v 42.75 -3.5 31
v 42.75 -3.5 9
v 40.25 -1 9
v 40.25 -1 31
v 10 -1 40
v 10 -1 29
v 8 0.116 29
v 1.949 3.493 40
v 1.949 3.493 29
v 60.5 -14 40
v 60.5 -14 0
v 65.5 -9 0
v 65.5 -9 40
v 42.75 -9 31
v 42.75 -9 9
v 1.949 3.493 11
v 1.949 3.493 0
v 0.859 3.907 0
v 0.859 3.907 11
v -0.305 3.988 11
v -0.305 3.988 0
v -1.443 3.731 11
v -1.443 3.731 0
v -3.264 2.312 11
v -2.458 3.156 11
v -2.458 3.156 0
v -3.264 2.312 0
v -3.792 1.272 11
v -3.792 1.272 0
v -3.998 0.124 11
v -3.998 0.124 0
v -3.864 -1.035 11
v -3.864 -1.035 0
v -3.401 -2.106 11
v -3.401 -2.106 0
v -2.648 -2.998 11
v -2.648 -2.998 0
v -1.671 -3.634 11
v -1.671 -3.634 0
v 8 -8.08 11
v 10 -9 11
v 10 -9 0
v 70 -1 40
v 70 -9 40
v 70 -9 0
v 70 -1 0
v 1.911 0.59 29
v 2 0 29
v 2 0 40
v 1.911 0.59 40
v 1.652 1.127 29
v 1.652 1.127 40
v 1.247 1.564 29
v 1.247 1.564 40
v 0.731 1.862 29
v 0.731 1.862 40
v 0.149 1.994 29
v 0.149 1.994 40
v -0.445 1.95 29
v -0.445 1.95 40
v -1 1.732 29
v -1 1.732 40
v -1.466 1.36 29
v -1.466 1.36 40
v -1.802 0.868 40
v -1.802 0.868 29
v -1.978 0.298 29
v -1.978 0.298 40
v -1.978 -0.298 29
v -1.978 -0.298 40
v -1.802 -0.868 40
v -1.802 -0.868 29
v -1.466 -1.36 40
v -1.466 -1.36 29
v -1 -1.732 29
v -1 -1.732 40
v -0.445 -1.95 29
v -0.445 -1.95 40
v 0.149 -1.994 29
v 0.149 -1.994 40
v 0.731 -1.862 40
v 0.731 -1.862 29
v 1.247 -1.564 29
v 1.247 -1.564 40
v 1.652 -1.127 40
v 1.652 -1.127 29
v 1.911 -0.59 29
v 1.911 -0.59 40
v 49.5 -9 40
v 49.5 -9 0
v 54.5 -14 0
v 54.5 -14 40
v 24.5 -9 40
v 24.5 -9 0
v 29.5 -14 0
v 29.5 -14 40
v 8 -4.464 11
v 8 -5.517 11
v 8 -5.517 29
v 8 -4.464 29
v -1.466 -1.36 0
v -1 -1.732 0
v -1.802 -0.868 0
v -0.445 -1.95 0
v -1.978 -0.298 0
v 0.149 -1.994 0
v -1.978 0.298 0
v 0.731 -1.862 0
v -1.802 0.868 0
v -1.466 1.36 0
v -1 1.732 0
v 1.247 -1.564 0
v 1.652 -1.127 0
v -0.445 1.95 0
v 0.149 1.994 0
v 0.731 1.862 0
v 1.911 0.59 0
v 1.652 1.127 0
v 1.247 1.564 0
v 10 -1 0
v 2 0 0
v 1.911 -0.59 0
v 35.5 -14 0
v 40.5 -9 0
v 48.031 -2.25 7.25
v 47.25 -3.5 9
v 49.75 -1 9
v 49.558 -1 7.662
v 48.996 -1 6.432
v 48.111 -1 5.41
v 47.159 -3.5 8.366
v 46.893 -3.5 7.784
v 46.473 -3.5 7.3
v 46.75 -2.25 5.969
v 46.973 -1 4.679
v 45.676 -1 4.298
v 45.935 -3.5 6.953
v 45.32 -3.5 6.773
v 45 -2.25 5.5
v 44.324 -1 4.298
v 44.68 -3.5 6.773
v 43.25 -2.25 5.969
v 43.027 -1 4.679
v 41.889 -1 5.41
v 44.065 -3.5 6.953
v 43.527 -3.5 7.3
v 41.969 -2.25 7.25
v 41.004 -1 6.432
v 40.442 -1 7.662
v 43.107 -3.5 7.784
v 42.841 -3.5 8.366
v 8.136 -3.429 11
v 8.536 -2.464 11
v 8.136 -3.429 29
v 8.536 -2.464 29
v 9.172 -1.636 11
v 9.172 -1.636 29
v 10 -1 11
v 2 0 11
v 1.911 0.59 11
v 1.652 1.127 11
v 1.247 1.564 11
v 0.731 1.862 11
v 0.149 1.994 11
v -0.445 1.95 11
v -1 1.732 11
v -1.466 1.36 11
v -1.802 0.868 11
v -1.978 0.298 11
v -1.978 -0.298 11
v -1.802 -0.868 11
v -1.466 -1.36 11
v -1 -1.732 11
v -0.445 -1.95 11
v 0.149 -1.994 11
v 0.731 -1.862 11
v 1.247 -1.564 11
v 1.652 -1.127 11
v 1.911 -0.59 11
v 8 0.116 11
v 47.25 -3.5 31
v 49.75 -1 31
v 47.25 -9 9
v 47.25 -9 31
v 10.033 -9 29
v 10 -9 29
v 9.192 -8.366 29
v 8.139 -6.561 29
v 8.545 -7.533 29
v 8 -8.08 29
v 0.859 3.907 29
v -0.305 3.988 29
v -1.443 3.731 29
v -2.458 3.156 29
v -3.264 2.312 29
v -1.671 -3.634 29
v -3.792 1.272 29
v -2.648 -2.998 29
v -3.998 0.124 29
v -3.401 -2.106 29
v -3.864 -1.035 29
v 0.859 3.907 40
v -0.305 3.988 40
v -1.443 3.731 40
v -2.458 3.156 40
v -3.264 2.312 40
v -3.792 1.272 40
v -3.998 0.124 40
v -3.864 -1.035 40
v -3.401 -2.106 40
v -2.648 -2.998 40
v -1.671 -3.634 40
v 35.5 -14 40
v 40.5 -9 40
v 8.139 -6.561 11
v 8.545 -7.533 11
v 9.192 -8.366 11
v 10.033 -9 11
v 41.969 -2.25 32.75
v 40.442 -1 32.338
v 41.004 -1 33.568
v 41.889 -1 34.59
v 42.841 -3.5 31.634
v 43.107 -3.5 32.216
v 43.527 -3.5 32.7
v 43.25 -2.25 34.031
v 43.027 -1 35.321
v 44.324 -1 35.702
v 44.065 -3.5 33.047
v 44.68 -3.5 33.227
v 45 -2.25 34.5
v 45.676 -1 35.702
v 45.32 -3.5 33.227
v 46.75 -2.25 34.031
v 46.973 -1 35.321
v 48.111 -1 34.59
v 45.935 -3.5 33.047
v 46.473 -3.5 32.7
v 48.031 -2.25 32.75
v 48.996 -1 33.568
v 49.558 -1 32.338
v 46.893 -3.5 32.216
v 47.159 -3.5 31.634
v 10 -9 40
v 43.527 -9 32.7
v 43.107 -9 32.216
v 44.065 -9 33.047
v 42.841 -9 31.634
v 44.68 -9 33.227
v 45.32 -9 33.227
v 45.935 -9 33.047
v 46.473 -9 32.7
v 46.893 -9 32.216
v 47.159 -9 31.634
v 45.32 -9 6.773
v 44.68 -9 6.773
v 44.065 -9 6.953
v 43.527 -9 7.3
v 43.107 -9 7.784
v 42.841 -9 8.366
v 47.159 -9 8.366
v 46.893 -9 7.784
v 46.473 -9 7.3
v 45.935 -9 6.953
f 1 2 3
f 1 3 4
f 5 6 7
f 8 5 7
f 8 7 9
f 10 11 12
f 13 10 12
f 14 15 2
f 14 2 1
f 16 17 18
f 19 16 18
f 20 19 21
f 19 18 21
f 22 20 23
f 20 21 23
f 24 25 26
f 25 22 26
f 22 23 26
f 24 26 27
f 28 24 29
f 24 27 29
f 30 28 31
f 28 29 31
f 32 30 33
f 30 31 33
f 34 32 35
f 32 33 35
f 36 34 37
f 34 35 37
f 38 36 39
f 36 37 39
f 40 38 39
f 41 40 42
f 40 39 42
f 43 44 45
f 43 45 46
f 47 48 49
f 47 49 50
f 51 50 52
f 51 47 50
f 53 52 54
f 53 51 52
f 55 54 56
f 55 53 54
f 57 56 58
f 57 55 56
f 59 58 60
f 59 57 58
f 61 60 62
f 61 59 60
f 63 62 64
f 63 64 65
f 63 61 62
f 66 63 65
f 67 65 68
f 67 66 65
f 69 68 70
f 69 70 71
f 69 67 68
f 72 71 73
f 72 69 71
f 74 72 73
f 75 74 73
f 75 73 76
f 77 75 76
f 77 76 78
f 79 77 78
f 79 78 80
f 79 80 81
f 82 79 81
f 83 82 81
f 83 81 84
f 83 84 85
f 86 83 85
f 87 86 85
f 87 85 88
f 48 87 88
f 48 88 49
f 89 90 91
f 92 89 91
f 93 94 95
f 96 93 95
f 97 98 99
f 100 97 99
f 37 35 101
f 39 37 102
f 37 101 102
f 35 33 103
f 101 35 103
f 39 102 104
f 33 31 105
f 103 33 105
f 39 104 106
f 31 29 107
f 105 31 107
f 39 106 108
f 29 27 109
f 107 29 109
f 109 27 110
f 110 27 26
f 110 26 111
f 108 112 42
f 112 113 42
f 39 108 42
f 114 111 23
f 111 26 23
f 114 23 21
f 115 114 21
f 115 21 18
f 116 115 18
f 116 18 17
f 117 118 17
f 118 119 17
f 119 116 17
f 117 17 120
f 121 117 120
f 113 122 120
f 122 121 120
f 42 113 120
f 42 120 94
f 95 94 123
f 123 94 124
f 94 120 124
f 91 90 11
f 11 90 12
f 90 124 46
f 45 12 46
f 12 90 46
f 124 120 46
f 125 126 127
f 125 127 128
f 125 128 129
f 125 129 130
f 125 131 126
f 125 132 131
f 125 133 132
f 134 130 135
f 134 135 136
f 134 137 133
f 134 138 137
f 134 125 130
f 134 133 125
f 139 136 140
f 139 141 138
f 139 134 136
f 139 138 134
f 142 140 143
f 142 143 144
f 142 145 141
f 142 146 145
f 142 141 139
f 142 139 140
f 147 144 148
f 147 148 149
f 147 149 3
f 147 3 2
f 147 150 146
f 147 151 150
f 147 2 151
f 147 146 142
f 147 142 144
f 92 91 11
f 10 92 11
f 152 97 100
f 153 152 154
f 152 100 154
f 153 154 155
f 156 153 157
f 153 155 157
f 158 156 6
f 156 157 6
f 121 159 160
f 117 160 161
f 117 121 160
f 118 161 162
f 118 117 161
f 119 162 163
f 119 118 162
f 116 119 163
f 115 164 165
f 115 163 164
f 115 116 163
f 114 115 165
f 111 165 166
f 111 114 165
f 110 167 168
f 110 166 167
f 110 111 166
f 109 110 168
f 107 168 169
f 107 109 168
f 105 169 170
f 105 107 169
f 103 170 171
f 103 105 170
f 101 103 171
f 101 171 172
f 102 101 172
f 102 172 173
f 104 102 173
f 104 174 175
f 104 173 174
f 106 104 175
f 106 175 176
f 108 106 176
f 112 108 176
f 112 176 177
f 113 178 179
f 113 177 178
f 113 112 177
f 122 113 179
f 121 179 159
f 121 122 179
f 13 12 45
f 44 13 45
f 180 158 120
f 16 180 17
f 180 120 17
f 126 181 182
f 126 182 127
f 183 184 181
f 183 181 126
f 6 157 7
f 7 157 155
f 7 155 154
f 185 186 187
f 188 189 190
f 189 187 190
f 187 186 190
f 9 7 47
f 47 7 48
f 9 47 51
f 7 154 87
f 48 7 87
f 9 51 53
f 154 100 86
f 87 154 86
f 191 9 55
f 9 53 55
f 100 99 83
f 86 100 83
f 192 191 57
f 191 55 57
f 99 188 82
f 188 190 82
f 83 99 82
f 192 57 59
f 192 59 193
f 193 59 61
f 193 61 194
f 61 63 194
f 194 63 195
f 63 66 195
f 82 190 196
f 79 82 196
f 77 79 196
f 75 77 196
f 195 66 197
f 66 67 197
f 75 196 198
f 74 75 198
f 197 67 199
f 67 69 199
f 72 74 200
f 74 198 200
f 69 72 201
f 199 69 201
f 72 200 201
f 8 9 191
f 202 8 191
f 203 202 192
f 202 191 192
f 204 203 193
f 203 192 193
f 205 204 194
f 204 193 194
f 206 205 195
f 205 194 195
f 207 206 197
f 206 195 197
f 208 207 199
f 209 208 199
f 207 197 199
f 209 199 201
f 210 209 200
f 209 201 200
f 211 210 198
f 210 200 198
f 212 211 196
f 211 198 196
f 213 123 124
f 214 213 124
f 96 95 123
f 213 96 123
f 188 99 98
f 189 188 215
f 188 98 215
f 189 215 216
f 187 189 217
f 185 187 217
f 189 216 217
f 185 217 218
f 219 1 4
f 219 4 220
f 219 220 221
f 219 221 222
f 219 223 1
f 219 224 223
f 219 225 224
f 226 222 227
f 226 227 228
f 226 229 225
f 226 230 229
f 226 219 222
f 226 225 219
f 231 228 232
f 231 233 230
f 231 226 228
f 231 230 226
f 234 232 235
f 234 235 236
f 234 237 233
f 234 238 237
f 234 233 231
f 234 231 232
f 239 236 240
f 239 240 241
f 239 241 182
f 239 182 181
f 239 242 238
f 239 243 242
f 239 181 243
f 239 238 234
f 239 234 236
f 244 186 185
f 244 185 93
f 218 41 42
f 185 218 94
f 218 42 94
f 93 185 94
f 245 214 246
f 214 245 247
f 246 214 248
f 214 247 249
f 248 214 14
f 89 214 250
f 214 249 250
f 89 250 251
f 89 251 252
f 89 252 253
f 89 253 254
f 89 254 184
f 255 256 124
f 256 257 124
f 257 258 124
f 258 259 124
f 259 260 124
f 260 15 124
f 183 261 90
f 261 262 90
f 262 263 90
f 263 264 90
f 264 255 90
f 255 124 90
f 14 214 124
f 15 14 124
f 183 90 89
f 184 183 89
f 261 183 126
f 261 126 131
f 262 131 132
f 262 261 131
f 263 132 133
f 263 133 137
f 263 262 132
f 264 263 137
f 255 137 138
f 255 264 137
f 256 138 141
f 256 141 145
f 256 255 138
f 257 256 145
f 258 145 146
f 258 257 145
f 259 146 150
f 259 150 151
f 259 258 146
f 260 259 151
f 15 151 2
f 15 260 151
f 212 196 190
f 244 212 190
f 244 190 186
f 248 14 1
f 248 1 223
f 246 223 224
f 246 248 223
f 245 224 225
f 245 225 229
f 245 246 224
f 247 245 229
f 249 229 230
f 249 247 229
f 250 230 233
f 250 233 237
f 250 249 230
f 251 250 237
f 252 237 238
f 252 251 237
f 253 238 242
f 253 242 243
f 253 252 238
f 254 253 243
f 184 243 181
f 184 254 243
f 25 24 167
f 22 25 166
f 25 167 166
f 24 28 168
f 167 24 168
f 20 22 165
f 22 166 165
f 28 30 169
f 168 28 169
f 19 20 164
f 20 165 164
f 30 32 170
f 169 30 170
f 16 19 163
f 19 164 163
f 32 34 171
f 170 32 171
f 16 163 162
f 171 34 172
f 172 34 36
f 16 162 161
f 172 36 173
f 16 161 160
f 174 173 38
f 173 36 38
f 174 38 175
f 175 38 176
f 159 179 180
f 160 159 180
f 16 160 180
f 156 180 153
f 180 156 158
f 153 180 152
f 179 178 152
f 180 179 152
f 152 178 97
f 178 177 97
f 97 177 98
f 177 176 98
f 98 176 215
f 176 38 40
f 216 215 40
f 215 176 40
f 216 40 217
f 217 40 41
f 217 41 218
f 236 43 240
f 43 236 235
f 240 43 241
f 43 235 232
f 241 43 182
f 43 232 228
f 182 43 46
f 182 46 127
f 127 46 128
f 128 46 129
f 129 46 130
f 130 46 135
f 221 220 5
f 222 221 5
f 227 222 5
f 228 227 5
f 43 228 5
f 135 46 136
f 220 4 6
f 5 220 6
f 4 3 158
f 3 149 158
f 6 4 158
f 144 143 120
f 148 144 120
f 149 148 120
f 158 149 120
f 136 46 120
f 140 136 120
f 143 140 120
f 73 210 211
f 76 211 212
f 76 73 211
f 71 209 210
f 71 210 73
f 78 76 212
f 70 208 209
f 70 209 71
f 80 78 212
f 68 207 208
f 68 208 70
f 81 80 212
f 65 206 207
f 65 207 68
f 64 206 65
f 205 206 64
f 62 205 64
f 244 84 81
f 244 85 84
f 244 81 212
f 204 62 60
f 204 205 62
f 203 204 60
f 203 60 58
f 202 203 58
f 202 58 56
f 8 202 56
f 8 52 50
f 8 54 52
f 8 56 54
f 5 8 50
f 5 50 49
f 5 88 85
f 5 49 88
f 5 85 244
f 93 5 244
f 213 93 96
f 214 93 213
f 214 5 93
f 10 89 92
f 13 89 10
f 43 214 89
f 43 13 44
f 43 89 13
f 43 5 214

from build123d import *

# Parameters (mm, degrees)
SKETCH1_R           = 2
BOSS_EXTRUDE1_DEPTH = 40
CUT_EXTRUDE1_DEPTH  = 82.663945533
CHAMFER1_SIZE       = 2.5
SKETCH3_W           = 12
SKETCH3_H           = 18
CUT_EXTRUDE2_DEPTH  = 82.663945533
FILLET1_R           = 4


with BuildPart() as part:
    # Sketch1 → Boss-Extrude1 (new body)
    with BuildSketch(Plane.XY):
        with BuildLine():
            Line((10, -9), (24.5, -9))
            Line((24.5, -9), (29.5, -14))
            Line((29.5, -14), (35.5, -14))
            Line((35.5, -14), (40.5, -9))
            Line((40.5, -9), (49.5, -9))
            Line((49.5, -9), (54.5, -14))
            Line((54.5, -14), (60.5, -14))
            Line((60.5, -14), (65.5, -9))
            Line((65.5, -9), (70, -9))
            Line((70, -9), (70, -1))
            Line((70, -1), (10, -1))
            Line((10, -1), (1.949288889, 3.492888894))
            ThreePointArc((1.949288889, 3.492888894), (-3.566315144, 1.811462473), (-1.670874988, -3.634305542))
            Line((-1.670874988, -3.634305542), (10, -9))
        make_face()
        Circle(SKETCH1_R, mode=Mode.SUBTRACT)
    extrude(amount=BOSS_EXTRUDE1_DEPTH)

    # Sketch2 → Cut-Extrude1 (cut, through all)
    with BuildSketch(Plane.XZ.offset(9)):
        with BuildLine():
            Line((47.25, 31), (47.25, 9))
            ThreePointArc((47.25, 9), (45, 6.75), (42.75, 9))
            Line((42.75, 9), (42.75, 31))
            ThreePointArc((42.75, 31), (45, 33.25), (47.25, 31))
        make_face()
    extrude(amount=-CUT_EXTRUDE1_DEPTH, mode=Mode.SUBTRACT)

    # Chamfer1
    chamfer1_edges = [part.edges().sort_by_distance(p)[0] for p in [
        (42.75, -1, 20),
        (45, -1, 6.75),
        (47.25, -1, 20),
        (45, -1, 33.25),
    ]]
    chamfer(chamfer1_edges, length=CHAMFER1_SIZE)

    # Sketch3 → Cut-Extrude2 (cut, through all)
    with BuildSketch(Plane.XZ.offset(9)):
        with Locations((2, 20)):
            Rectangle(SKETCH3_W, SKETCH3_H)
    extrude(amount=-CUT_EXTRUDE2_DEPTH, mode=Mode.SUBTRACT)

    # Fillet1
    # the kernel refuses this fillet: 4 mm, written as the material it takes off along each edge
    with BuildSketch(Plane(origin=(8, 0.116147091, 29), x_dir=(0.8732222234943452, -0.4873222223494347, 0), z_dir=(0, 0, -1))) as fillet1_piece_1:
        with BuildLine():
            CenterArc((5.724945872, 2.05028607), FILLET1_R, 150.835269547, 60)
            Line((2.232056978, 3.999574959), (0, 0))
            Line((0, 0), (2.290367728, 0))
        make_face()
    extrude(amount=18, mode=Mode.SUBTRACT)
    with BuildSketch(Plane(origin=(8, -8.080498341, 11), x_dir=(0.9085763855616094, -0.4177187470054484, 0), z_dir=(0, 0, 1))) as fillet1_piece_2:
        with BuildLine():
            CenterArc((FILLET1_R * 0.640872096444, FILLET1_R), FILLET1_R, 204.690646006, 65.309353994)
            Line((-FILLET1_R * 0.267704289117, FILLET1_R * 0.582281252995), (0, 0))
            Line((0, 0), (FILLET1_R * 0.640872096444, 0))
        make_face()
    extrude(amount=18, mode=Mode.SUBTRACT)


solid = part.part
